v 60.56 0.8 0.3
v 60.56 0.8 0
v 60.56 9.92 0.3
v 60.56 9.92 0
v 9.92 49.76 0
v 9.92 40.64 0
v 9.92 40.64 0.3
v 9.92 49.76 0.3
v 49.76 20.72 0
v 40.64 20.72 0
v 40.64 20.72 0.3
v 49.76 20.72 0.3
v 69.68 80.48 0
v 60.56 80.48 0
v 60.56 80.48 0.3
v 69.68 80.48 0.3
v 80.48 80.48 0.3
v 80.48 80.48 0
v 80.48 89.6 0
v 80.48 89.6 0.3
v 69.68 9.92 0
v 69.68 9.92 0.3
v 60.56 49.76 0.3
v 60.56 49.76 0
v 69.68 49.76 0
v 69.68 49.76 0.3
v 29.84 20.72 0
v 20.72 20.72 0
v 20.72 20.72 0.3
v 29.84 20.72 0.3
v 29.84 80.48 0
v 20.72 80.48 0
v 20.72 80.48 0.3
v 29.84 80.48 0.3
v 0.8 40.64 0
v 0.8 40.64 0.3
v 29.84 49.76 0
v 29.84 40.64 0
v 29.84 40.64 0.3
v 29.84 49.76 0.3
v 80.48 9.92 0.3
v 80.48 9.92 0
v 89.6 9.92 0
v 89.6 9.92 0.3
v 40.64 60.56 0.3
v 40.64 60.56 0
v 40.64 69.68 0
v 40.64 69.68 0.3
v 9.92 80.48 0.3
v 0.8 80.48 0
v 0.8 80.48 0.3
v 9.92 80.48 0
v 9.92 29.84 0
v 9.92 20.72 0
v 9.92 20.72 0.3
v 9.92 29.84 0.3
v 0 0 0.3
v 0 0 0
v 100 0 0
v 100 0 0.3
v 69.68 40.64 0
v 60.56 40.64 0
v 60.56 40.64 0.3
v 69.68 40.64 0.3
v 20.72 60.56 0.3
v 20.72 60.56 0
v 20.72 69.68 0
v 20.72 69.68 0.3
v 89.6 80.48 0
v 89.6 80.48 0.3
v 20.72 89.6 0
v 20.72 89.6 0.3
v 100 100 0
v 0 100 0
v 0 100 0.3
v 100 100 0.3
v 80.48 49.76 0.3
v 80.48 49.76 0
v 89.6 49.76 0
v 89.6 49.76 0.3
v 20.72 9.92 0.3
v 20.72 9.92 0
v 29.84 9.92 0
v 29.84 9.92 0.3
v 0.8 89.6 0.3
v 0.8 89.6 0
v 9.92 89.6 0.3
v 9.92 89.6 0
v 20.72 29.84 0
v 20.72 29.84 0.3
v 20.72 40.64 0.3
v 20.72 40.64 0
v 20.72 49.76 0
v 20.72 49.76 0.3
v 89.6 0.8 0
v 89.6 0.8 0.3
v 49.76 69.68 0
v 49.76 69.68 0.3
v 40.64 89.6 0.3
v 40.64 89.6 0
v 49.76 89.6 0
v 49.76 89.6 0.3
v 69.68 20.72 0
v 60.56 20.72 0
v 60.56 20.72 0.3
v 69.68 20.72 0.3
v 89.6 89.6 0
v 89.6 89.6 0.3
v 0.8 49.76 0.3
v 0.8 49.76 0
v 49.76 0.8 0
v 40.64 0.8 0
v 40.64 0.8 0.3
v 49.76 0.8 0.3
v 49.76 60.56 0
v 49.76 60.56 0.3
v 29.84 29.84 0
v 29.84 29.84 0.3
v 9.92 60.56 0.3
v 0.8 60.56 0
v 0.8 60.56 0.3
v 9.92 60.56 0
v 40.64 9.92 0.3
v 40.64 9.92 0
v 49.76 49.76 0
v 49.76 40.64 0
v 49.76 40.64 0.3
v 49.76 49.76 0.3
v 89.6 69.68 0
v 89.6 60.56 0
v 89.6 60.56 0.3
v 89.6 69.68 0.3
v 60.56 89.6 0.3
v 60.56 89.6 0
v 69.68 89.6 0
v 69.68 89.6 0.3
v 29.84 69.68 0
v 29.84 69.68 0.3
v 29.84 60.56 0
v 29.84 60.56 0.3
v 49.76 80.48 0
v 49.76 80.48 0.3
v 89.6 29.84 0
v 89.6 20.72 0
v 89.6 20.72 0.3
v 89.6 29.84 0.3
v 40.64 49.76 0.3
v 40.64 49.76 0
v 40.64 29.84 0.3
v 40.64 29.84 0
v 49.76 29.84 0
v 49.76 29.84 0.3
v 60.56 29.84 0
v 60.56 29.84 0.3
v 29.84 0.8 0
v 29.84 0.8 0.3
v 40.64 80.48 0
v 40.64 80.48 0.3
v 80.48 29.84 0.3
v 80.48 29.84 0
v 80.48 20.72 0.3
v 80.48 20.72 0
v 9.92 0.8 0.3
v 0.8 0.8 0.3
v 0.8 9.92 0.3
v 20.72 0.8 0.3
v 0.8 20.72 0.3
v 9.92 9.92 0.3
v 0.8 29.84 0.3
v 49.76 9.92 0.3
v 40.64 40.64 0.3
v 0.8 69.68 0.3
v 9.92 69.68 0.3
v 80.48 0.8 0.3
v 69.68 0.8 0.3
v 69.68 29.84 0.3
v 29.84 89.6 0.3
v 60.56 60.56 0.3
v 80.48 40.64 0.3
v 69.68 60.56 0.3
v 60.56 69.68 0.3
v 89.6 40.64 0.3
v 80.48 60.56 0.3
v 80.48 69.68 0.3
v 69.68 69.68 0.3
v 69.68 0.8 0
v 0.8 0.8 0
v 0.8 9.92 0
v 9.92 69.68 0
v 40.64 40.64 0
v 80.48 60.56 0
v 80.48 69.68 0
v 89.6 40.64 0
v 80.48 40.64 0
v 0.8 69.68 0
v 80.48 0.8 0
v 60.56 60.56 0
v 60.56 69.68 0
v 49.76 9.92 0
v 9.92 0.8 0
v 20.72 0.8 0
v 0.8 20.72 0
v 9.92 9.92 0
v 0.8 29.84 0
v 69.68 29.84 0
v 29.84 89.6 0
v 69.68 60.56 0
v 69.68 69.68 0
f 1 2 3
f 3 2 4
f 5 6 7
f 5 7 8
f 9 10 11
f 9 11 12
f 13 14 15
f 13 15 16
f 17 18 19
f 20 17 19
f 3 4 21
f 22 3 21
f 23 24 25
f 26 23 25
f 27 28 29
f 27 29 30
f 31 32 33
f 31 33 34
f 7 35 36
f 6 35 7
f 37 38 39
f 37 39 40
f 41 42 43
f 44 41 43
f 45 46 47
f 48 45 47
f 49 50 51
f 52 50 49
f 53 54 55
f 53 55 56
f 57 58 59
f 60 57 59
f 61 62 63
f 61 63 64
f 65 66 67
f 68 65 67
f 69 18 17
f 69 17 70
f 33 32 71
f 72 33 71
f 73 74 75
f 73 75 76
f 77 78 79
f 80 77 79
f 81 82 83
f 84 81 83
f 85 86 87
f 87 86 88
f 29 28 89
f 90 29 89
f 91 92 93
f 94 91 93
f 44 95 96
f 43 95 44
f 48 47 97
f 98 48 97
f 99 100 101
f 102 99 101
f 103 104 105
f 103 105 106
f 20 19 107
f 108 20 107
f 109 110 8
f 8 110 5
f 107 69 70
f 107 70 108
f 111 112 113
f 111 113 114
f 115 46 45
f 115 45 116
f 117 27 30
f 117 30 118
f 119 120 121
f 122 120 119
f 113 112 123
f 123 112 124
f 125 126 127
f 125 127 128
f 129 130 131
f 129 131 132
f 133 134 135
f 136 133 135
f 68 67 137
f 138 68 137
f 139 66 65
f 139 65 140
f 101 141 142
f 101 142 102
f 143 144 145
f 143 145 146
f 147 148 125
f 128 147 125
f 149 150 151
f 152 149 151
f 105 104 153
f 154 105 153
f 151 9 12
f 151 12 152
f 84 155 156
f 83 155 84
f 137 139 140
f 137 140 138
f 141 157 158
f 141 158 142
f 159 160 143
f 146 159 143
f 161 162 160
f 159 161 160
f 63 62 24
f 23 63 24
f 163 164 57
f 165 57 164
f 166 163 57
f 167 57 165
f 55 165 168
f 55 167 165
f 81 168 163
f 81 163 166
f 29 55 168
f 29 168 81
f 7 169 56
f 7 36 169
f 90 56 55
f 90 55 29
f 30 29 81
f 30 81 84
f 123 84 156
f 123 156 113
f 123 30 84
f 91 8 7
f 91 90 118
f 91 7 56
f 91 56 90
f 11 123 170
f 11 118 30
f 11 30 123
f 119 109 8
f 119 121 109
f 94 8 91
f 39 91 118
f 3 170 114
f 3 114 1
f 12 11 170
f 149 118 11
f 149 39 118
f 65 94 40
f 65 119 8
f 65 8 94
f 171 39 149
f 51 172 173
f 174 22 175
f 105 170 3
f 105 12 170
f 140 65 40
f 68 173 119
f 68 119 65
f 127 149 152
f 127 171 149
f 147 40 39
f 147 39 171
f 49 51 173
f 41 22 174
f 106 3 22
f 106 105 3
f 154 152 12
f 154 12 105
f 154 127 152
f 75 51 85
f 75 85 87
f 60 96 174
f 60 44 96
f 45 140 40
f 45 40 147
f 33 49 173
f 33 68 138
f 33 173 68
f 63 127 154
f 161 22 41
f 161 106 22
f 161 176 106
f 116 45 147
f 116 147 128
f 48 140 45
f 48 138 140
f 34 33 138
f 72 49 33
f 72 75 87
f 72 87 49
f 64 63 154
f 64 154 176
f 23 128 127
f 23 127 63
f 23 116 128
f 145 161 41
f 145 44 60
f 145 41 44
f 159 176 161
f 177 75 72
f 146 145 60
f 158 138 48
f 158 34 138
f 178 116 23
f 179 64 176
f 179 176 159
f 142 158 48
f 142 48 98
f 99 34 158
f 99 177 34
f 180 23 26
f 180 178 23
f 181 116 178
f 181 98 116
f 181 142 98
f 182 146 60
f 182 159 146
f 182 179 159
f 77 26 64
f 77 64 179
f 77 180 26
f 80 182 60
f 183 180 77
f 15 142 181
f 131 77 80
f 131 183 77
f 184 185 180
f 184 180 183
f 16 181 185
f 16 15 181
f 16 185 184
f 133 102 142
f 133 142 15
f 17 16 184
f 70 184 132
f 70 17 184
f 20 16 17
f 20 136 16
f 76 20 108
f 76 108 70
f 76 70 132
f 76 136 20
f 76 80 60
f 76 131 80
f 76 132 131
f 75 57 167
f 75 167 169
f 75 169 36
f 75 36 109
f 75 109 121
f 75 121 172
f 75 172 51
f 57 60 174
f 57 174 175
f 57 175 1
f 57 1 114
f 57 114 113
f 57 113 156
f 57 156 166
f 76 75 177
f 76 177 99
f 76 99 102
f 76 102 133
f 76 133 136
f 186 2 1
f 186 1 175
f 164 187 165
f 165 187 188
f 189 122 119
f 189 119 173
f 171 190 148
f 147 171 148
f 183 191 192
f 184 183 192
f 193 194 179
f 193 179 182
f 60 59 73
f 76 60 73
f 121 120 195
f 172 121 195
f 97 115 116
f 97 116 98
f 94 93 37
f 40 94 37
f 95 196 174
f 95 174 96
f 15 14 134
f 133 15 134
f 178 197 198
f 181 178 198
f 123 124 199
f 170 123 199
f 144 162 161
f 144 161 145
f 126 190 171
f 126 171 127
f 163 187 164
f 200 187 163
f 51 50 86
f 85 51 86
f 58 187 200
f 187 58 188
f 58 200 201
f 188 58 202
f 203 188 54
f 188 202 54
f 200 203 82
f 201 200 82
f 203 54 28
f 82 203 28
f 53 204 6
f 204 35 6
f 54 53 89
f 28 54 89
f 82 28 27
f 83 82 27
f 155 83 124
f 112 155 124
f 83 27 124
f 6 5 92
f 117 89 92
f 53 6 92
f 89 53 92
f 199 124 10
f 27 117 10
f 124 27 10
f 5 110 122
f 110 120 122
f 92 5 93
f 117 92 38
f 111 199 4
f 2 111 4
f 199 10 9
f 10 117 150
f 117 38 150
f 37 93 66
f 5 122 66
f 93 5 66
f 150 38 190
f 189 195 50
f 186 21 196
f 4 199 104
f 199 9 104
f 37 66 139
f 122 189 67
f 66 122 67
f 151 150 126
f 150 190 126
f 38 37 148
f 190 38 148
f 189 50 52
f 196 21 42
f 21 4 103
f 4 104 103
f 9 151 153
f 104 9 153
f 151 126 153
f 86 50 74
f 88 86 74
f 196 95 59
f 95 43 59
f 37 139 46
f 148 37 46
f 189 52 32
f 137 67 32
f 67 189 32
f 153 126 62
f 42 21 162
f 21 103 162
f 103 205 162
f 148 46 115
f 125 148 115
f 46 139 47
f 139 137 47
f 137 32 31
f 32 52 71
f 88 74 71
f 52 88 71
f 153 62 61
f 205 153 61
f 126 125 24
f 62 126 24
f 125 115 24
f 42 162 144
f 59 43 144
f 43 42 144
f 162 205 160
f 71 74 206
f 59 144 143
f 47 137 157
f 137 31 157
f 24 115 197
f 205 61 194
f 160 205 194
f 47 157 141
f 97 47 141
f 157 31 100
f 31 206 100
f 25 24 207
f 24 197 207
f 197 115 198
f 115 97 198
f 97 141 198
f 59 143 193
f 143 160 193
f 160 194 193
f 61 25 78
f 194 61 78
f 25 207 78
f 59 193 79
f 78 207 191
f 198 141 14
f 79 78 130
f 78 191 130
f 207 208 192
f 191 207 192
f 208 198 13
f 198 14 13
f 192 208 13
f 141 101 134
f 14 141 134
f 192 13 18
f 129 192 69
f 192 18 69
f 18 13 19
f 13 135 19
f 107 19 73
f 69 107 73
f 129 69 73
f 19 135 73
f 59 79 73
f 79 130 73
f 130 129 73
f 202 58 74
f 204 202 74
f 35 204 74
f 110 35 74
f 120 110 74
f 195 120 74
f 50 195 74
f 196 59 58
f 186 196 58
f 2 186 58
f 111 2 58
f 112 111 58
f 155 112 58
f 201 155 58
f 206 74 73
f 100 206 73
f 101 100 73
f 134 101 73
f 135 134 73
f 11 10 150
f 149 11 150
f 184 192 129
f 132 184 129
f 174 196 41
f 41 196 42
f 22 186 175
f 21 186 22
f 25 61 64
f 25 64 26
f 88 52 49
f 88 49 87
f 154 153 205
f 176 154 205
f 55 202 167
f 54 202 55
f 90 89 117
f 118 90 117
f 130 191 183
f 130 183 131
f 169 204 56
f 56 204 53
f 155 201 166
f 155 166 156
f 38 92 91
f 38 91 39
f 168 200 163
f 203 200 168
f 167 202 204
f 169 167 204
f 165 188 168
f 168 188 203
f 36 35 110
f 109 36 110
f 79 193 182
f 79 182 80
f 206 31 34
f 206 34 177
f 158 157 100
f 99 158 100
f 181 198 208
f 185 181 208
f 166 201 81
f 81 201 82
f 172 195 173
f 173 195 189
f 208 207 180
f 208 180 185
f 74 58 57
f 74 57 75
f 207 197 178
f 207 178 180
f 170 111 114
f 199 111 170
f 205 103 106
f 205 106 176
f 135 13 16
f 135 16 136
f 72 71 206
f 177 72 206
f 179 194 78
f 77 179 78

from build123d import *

# Parameters (mm, degrees)
F0_W     = 100
F0_H     = 100
F0_W_2   = 9.12
F0_H_2   = 9.12
F1_DEPTH = 0.3


with BuildPart() as f1:
    # F0 (on Top) → F1 (new body)
    with BuildSketch(Plane.XY):
        with Locations((50, 50)):
            Rectangle(F0_W, F0_H)
        with Locations((5.36, 5.36)):
            Rectangle(F0_W_2, F0_H_2, mode=Mode.SUBTRACT)
        with Locations((25.28, 5.36)):
            Rectangle(F0_W_2, F0_H_2, mode=Mode.SUBTRACT)
        with Locations((45.2, 5.36)):
            Rectangle(F0_W_2, F0_H_2, mode=Mode.SUBTRACT)
        with Locations((5.36, 25.28)):
            Rectangle(F0_W_2, F0_H_2, mode=Mode.SUBTRACT)
        with Locations((5.36, 45.2)):
            Rectangle(F0_W_2, F0_H_2, mode=Mode.SUBTRACT)
        with Locations((25.28, 25.28)):
            Rectangle(F0_W_2, F0_H_2, mode=Mode.SUBTRACT)
        with Locations((45.2, 25.28)):
            Rectangle(F0_W_2, F0_H_2, mode=Mode.SUBTRACT)
        with Locations((25.28, 45.2)):
            Rectangle(F0_W_2, F0_H_2, mode=Mode.SUBTRACT)
        with Locations((45.2, 45.2)):
            Rectangle(F0_W_2, F0_H_2, mode=Mode.SUBTRACT)
        with Locations((65.12, 5.36)):
            Rectangle(F0_W_2, F0_H_2, mode=Mode.SUBTRACT)
        with Locations((85.04, 5.36)):
            Rectangle(F0_W_2, F0_H_2, mode=Mode.SUBTRACT)
        with Locations((65.12, 25.28)):
            Rectangle(F0_W_2, F0_H_2, mode=Mode.SUBTRACT)
        with Locations((65.12, 45.2)):
            Rectangle(F0_W_2, F0_H_2, mode=Mode.SUBTRACT)
        with Locations((85.04, 25.28)):
            Rectangle(F0_W_2, F0_H_2, mode=Mode.SUBTRACT)
        with Locations((85.04, 45.2)):
            Rectangle(F0_W_2, F0_H_2, mode=Mode.SUBTRACT)
        with Locations((5.36, 65.12)):
            Rectangle(F0_W_2, F0_H_2, mode=Mode.SUBTRACT)
        with Locations((25.28, 65.12)):
            Rectangle(F0_W_2, F0_H_2, mode=Mode.SUBTRACT)
        with Locations((45.2, 65.12)):
            Rectangle(F0_W_2, F0_H_2, mode=Mode.SUBTRACT)
        with Locations((5.36, 85.04)):
            Rectangle(F0_W_2, F0_H_2, mode=Mode.SUBTRACT)
        with Locations((25.28, 85.04)):
            Rectangle(F0_W_2, F0_H_2, mode=Mode.SUBTRACT)
        with Locations((45.2, 85.04)):
            Rectangle(F0_W_2, F0_H_2, mode=Mode.SUBTRACT)
        with Locations((65.12, 65.12)):
            Rectangle(F0_W_2, F0_H_2, mode=Mode.SUBTRACT)
        with Locations((85.04, 65.12)):
            Rectangle(F0_W_2, F0_H_2, mode=Mode.SUBTRACT)
        with Locations((65.12, 85.04)):
            Rectangle(F0_W_2, F0_H_2, mode=Mode.SUBTRACT)
        with Locations((85.04, 85.04)):
            Rectangle(F0_W_2, F0_H_2, mode=Mode.SUBTRACT)
    extrude(amount=F1_DEPTH)


solid = f1.part
